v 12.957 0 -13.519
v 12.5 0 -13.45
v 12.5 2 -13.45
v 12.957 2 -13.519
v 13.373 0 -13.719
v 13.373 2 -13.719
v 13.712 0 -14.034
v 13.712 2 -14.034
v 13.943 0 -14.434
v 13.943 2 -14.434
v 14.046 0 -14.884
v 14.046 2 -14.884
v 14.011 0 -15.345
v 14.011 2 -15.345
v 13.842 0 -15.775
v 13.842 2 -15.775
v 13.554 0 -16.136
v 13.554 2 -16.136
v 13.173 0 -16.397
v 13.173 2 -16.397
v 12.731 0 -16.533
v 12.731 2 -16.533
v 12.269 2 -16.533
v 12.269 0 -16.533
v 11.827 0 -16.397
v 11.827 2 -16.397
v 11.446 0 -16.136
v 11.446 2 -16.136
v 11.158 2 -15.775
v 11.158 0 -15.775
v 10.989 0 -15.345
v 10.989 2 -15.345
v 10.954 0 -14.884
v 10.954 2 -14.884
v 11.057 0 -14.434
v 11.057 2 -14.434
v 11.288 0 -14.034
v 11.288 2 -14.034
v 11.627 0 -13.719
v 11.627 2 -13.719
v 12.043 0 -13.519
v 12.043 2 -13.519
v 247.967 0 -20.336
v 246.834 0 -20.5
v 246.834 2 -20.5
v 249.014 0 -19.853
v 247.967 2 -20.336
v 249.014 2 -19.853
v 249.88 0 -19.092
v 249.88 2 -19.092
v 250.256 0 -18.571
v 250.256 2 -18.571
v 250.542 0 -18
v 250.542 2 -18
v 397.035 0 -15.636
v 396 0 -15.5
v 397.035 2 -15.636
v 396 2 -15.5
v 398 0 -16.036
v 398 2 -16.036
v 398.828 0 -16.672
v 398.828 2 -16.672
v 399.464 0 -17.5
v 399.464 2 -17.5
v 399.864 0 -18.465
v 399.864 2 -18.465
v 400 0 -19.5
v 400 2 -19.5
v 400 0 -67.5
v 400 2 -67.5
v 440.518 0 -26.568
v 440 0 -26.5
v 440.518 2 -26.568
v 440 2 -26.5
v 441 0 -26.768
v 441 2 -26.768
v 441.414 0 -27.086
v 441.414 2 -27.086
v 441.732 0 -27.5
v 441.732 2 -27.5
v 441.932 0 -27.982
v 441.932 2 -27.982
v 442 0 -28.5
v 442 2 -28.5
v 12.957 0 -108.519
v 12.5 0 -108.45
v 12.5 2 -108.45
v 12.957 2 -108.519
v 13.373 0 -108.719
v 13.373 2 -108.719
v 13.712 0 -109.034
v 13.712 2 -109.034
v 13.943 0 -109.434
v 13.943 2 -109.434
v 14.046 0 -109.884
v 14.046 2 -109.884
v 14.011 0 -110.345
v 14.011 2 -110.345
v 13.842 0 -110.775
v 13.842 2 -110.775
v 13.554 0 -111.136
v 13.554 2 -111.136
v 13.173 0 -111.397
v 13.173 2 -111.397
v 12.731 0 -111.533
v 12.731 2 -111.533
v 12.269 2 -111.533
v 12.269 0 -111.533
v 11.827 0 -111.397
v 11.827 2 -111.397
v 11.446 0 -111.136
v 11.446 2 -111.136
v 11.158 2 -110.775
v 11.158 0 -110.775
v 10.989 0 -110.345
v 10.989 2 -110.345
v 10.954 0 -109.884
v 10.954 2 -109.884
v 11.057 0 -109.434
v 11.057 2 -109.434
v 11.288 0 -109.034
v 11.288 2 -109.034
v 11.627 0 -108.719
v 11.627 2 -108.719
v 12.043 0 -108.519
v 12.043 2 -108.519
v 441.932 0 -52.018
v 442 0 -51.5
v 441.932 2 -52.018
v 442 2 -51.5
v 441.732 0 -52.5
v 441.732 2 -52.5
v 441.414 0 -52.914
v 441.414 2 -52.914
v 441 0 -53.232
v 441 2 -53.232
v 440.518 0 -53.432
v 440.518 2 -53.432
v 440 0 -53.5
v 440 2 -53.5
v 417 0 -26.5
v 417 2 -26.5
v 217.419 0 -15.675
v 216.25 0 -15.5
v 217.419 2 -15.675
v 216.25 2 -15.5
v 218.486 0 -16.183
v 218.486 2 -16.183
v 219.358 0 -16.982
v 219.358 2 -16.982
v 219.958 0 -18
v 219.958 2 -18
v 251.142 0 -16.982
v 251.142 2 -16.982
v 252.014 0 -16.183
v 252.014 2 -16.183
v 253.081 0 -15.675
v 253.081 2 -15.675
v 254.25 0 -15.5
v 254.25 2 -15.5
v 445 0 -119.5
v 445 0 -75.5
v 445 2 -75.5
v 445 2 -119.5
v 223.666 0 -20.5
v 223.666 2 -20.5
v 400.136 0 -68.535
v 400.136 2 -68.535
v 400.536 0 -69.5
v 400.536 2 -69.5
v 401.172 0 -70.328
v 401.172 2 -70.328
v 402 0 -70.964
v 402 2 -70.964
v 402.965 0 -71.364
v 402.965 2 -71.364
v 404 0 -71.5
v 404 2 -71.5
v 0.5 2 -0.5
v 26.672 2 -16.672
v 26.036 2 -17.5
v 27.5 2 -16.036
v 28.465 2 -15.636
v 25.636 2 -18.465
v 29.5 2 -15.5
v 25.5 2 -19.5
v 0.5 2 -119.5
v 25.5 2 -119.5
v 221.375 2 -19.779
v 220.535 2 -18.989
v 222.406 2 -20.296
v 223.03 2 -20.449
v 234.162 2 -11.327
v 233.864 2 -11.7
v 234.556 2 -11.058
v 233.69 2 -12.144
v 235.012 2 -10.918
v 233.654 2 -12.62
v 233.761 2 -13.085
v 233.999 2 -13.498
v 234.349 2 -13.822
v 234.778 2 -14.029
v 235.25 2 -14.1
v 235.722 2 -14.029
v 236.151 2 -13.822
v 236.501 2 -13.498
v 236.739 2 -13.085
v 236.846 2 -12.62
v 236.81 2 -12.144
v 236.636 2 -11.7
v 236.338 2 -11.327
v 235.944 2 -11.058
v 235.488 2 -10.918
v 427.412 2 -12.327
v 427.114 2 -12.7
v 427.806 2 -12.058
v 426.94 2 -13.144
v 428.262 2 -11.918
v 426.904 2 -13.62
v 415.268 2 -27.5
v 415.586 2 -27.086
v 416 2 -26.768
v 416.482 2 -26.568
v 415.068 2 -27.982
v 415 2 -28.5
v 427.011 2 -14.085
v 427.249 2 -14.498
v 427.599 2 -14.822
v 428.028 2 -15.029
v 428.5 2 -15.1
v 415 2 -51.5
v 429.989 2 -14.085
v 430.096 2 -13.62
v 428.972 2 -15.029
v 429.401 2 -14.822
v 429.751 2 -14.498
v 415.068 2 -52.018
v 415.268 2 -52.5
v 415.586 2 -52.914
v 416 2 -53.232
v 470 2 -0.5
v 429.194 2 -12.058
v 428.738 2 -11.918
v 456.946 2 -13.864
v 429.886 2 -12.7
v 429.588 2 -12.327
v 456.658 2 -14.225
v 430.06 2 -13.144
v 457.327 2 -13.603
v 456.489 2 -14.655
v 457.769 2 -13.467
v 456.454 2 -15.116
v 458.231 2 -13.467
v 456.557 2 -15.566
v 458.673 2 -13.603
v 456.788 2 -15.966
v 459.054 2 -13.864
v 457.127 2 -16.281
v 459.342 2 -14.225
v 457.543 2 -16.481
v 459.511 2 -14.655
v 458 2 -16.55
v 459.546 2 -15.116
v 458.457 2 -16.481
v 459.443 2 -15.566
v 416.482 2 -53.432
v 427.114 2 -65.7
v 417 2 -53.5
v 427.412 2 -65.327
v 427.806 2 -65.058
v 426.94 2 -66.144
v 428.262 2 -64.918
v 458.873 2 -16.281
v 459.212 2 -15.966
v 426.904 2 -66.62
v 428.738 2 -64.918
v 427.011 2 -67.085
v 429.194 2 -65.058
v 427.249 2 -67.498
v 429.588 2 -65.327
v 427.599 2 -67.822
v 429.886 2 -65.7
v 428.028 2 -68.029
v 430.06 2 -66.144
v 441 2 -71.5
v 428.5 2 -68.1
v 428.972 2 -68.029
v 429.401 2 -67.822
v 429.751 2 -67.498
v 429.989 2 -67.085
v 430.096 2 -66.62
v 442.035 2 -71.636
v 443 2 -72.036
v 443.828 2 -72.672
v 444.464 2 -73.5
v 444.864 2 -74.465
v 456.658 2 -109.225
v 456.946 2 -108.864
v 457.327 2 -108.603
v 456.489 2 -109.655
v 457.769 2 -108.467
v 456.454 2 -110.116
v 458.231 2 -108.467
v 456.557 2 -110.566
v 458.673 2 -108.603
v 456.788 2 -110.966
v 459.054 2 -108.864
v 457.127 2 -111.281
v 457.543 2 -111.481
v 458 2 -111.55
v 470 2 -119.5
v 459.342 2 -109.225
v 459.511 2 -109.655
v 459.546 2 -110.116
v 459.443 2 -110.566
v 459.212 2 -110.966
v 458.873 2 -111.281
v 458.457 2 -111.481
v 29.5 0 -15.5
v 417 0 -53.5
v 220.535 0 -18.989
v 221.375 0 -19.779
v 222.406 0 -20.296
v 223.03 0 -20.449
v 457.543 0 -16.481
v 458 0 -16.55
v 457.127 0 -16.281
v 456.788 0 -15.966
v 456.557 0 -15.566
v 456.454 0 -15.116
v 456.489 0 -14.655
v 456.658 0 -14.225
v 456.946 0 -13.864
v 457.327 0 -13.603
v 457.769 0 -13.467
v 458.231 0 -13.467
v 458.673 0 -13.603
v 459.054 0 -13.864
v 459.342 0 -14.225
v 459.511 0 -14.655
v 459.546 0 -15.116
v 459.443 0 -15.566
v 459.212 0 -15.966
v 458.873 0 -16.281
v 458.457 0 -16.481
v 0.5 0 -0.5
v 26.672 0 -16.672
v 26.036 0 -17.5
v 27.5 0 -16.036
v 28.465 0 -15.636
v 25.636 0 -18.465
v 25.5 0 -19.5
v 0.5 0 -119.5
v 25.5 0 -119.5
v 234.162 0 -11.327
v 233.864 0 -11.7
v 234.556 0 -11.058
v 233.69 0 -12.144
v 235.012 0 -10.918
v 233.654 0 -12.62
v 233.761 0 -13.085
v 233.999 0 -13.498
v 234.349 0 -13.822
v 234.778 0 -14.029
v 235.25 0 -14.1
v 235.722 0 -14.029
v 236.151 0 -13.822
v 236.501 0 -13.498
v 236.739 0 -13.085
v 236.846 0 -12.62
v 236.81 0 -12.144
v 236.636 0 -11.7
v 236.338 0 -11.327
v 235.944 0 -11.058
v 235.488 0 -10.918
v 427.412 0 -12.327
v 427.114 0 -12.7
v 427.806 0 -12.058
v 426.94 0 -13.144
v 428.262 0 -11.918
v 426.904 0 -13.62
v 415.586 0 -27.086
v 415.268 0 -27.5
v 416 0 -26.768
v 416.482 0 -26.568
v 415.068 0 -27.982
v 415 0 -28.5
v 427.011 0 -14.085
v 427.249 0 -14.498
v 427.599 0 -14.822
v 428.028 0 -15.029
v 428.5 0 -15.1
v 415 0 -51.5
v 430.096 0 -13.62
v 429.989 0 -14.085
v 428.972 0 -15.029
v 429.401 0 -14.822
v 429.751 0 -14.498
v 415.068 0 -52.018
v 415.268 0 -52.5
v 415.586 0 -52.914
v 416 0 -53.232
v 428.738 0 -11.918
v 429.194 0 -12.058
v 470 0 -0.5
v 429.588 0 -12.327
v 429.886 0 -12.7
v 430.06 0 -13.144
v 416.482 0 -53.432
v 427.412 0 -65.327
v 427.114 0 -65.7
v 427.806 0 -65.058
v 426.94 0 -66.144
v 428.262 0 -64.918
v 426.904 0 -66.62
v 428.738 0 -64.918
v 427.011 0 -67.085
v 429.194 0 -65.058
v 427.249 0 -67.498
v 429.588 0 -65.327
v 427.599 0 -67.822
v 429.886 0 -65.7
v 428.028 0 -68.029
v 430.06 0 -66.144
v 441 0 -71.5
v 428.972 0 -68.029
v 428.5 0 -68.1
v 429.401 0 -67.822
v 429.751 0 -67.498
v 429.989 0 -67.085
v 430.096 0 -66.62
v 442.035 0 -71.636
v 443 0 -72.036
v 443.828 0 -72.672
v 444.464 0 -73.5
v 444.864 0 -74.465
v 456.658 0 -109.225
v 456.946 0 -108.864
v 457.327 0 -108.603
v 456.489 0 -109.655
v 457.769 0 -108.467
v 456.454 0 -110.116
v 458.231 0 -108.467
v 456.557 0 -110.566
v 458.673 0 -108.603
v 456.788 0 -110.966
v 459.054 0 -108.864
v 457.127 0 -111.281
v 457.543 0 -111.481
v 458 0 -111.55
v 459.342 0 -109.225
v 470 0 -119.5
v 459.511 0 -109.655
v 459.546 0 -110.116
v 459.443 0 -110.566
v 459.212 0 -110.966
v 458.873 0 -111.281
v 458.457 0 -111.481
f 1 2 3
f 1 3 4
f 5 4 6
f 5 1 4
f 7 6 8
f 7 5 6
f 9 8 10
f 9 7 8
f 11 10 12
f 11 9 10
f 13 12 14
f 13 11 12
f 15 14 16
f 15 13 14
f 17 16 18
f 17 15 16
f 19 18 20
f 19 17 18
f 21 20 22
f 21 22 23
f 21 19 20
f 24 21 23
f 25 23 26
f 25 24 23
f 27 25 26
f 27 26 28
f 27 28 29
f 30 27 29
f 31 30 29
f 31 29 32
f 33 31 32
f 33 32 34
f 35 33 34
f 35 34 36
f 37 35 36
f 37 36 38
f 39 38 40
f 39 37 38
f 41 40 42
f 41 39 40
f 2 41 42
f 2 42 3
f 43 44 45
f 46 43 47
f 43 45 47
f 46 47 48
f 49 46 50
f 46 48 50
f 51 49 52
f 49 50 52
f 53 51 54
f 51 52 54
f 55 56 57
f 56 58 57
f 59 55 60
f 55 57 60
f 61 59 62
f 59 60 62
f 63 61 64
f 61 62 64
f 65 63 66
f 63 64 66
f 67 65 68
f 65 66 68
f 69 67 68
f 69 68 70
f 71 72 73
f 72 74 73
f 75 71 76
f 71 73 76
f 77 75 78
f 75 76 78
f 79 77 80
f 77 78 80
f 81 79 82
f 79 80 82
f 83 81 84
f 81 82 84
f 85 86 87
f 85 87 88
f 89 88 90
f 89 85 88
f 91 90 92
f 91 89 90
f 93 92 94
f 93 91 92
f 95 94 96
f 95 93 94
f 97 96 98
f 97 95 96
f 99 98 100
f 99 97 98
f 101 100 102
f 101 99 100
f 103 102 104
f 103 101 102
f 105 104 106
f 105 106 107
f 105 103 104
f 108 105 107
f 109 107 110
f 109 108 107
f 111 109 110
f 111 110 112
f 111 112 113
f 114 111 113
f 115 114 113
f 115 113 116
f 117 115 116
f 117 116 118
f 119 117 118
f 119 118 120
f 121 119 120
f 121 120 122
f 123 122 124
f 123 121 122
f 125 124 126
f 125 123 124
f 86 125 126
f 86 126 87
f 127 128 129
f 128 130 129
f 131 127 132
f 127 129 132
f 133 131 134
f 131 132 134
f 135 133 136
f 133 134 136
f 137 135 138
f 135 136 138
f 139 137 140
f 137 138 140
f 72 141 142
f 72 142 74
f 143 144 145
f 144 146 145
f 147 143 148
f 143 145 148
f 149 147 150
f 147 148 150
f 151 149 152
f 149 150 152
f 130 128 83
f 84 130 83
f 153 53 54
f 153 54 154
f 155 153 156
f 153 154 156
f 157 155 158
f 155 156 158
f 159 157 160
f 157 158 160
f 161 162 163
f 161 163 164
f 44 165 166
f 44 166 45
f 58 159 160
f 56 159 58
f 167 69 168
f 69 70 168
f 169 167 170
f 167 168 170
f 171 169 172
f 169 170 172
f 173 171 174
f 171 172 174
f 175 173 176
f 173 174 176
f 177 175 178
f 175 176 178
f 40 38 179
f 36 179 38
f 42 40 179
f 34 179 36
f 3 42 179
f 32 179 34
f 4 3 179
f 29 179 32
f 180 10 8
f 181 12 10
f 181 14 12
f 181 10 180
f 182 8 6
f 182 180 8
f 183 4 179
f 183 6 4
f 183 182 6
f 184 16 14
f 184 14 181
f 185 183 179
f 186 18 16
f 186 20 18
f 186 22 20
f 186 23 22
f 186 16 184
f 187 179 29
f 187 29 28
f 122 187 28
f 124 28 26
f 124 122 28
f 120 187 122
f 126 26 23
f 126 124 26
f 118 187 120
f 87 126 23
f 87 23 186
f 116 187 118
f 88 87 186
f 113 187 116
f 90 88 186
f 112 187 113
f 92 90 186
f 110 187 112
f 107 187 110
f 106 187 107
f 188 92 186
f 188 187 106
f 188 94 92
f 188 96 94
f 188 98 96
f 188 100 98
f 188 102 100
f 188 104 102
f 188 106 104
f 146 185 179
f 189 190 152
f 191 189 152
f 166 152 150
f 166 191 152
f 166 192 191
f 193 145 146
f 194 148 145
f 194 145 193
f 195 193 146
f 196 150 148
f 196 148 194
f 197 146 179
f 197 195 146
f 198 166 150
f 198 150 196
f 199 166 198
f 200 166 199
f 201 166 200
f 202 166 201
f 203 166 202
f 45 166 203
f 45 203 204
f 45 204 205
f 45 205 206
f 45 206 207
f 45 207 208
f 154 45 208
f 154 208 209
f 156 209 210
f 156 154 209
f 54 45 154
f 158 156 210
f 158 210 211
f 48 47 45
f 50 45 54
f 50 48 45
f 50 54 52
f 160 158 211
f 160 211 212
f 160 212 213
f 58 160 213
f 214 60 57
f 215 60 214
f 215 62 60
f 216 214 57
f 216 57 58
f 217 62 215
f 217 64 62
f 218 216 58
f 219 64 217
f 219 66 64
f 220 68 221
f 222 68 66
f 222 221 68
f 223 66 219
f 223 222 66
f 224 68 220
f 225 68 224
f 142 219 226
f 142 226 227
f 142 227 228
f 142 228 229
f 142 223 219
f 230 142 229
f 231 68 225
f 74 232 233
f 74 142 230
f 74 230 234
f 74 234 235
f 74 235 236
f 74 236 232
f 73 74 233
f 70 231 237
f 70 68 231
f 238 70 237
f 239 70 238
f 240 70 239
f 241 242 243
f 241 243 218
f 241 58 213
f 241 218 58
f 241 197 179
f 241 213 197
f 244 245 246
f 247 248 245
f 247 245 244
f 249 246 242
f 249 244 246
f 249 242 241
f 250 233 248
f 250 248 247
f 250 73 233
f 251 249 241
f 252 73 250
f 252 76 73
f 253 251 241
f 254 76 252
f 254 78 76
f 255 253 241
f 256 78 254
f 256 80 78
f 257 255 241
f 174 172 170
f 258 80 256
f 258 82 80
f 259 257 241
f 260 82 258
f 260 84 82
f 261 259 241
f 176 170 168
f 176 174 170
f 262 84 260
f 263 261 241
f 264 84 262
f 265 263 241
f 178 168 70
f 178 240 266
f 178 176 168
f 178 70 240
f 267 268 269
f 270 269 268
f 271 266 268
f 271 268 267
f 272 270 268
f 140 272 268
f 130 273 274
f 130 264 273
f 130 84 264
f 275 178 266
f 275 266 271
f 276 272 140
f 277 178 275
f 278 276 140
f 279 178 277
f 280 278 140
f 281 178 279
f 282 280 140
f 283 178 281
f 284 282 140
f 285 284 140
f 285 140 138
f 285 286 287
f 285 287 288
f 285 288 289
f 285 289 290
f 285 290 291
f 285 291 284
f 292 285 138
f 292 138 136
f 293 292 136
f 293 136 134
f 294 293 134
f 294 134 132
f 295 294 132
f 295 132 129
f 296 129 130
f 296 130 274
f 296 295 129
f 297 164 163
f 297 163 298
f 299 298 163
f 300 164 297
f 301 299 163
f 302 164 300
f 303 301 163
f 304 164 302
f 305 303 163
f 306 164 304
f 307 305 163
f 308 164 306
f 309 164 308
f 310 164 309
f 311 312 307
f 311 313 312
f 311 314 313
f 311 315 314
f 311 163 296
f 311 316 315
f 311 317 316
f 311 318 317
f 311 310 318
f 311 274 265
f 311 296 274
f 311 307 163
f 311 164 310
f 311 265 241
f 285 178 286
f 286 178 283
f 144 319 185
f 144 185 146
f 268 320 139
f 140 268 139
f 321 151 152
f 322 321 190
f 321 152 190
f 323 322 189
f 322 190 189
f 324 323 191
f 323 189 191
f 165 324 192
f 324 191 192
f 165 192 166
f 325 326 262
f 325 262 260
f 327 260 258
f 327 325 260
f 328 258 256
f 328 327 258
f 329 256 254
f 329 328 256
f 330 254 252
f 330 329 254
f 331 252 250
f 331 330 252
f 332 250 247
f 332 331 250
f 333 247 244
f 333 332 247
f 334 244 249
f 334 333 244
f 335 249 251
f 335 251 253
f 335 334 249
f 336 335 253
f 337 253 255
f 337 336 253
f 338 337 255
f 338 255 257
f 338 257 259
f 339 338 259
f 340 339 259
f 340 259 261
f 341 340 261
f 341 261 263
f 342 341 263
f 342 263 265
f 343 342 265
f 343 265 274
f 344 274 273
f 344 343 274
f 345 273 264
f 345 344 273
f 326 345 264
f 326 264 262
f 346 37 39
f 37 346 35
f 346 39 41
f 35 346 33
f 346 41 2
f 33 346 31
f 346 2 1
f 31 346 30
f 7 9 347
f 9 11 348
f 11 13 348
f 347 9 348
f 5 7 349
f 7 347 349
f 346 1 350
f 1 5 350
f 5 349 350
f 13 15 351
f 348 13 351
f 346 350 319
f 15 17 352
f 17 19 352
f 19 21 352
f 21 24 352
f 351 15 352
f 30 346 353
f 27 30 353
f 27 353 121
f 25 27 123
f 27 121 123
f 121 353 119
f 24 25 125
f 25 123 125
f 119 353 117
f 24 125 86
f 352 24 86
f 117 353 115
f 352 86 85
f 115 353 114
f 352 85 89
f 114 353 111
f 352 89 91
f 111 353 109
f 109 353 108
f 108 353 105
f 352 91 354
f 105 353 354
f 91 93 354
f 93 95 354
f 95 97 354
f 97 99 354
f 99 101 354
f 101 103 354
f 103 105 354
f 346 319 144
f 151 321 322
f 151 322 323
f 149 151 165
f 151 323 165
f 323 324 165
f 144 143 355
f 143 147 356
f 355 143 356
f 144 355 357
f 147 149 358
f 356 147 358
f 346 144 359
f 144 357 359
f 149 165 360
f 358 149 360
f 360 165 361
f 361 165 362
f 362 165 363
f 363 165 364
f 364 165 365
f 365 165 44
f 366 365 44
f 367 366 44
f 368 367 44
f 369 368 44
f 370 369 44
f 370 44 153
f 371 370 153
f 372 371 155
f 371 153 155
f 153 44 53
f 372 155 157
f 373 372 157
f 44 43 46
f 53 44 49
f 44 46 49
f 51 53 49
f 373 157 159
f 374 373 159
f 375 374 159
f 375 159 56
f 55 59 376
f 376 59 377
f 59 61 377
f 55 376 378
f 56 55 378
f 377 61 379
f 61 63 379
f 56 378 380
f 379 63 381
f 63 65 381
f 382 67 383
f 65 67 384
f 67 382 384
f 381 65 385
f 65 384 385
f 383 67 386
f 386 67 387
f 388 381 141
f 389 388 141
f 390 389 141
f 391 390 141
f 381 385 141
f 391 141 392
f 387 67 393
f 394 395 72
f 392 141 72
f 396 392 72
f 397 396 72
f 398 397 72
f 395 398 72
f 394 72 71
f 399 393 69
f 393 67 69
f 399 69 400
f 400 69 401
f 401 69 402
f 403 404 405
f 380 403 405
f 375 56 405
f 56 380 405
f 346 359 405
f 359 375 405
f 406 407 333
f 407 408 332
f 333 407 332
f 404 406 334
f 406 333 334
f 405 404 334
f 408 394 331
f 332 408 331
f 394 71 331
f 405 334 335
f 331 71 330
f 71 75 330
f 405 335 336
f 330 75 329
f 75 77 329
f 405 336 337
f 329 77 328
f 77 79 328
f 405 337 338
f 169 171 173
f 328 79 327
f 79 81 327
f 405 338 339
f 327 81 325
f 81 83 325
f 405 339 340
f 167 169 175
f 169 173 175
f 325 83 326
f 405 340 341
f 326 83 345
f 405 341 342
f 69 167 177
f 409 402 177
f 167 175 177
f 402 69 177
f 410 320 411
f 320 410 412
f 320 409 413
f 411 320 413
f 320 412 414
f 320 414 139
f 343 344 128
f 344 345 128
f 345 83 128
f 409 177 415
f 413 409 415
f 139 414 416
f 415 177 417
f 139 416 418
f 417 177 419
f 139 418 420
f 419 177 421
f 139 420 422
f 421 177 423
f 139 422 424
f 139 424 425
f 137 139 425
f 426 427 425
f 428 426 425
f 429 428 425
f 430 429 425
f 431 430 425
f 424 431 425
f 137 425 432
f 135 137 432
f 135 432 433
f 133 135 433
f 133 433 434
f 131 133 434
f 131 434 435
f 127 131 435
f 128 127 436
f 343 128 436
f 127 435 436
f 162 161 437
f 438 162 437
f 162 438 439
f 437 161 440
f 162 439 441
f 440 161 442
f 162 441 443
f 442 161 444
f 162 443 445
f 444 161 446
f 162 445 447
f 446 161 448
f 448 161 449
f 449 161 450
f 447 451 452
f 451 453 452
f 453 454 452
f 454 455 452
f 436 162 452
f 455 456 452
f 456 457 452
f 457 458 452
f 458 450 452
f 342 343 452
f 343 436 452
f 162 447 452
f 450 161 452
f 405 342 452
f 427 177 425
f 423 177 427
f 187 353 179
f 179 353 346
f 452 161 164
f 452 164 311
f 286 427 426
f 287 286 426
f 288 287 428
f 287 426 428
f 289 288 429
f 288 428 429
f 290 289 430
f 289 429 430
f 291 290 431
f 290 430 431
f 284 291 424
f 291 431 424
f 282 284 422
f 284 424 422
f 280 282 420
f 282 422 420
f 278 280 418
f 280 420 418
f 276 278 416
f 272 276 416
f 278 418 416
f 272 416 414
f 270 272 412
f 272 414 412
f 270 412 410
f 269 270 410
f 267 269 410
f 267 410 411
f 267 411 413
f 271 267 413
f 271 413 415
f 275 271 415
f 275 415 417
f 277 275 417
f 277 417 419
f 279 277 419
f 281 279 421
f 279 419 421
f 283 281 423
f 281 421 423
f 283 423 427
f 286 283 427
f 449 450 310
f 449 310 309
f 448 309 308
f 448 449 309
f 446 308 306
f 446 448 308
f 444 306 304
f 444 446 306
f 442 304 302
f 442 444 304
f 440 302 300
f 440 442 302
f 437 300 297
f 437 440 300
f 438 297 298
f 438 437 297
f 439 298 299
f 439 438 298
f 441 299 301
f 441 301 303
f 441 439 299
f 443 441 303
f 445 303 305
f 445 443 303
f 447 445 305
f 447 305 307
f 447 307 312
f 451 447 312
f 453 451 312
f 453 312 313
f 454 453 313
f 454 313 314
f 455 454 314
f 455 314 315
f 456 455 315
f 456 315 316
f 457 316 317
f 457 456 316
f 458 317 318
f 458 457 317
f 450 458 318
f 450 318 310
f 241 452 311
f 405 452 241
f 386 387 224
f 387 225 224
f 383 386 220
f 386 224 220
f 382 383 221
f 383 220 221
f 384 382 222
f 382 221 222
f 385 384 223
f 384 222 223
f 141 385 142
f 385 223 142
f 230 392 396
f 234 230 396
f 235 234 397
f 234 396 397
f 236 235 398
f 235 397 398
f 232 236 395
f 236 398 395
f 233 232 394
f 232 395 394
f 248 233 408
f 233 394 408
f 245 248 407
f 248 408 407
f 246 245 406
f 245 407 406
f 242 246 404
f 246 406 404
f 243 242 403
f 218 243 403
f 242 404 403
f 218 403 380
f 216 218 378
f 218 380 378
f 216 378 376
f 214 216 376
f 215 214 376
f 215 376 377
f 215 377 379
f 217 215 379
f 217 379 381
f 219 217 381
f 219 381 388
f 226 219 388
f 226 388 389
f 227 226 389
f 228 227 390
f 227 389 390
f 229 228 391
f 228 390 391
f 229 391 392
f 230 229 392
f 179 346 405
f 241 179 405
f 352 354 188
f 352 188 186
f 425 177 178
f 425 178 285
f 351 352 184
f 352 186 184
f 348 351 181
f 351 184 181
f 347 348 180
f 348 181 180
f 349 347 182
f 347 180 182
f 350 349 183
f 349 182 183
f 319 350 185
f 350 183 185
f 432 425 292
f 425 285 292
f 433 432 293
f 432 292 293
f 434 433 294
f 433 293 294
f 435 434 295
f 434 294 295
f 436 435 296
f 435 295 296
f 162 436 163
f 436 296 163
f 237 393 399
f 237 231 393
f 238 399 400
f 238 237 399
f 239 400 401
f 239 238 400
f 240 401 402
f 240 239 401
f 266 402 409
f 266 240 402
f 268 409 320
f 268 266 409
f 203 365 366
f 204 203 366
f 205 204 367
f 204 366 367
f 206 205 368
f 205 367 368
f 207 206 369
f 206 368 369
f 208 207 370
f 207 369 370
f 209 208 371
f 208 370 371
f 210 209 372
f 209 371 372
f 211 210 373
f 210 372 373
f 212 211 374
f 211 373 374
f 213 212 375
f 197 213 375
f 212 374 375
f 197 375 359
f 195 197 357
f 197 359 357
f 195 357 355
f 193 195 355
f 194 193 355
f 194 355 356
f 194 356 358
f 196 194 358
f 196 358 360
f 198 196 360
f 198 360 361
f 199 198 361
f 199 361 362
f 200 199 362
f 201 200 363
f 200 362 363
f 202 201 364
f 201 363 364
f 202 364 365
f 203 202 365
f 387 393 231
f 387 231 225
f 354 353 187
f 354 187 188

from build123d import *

# Parameters (mm, degrees)
CROQUIS1_W              = 470.5
CROQUIS1_H              = 120
CROQUIS1_R              = 1.55
SALIENTE_EXTRUIR1_DEPTH = 2
CROQUIS2_W              = 470.5
CROQUIS2_H              = 120
CROQUIS2_W_2            = 469.5
CROQUIS2_H_2            = 119
CORTAR_EXTRUIR1_DEPTH   = 2
CROQUIS3_R              = 1.6
CORTAR_EXTRUIR2_DEPTH   = 2
CROQUIS4_R              = 1.6
CROQUIS4_W              = 27
CROQUIS4_H              = 27
CORTAR_EXTRUIR3_DEPTH   = 2
REDONDEO1_R             = 2
CORTAR_EXTRUIR4_DEPTH   = 2
REDONDEO2_R             = 4
REDONDEO3_R             = 4


with BuildPart() as part:
    # Croquis1 → Saliente-Extruir1 (new body)
    with BuildSketch(Plane(origin=(0, 0, 0), x_dir=(1, 0, 0), z_dir=(0, 1, 0))):
        with Locations((235.25, 60)):
            Rectangle(CROQUIS1_W, CROQUIS1_H)
        with Locations(Location((12.5, 15, 0), (0, 0, 270))):
            Circle(CROQUIS1_R, mode=Mode.SUBTRACT)
        with Locations(Location((12.5, 110, 0), (0, 0, 270))):
            Circle(CROQUIS1_R, mode=Mode.SUBTRACT)
        with Locations(Location((458, 15, 0), (0, 0, 90))):
            Circle(CROQUIS1_R, mode=Mode.SUBTRACT)
        with Locations(Location((458, 110, 0), (0, 0, 90))):
            Circle(CROQUIS1_R, mode=Mode.SUBTRACT)
    extrude(amount=SALIENTE_EXTRUIR1_DEPTH)

    # Croquis2 → Cortar-Extruir1 (cut)
    with BuildSketch(Plane.XZ):
        with Locations((235.25, -60)):
            Rectangle(CROQUIS2_W, CROQUIS2_H)
        with Locations((235.25, -60)):
            Rectangle(CROQUIS2_W_2, CROQUIS2_H_2, mode=Mode.SUBTRACT)
    extrude(amount=-CORTAR_EXTRUIR1_DEPTH, mode=Mode.SUBTRACT)

    # Croquis3 → Cortar-Extruir2 (cut)
    with BuildSketch(Plane.XZ):
        with Locations(Location((235.25, -12.5, 0), (0, 0, 270))):
            Circle(CROQUIS3_R)
    extrude(amount=-CORTAR_EXTRUIR2_DEPTH, mode=Mode.SUBTRACT)

    # Croquis4 → Cortar-Extruir3 (cut)
    with BuildSketch(Plane.XZ):
        with Locations(Location((428.5, -66.5, 0), (0, 0, 270))):
            Circle(CROQUIS4_R)
        with Locations(Location((428.5, -13.5, 0), (0, 0, 270))):
            Circle(CROQUIS4_R)
        with Locations((428.5, -40)):
            Rectangle(CROQUIS4_W, CROQUIS4_H)
    extrude(amount=-CORTAR_EXTRUIR3_DEPTH, mode=Mode.SUBTRACT)

    # Redondeo1
    redondeo1_edges = [part.edges().sort_by_distance(p)[0] for p in [
        (415, 1, -53.5),
        (442, 1, -53.5),
        (442, 1, -26.5),
        (415, 1, -26.5),
    ]]
    fillet(redondeo1_edges, radius=REDONDEO1_R)

    # Croquis5 → Cortar-Extruir4 (cut)
    with BuildSketch(Plane.XZ):
        Polygon((25.5, -119.5), (25.5, -15.5), (220.25, -15.5), (220.25, -20.5), (250.25, -20.5), (250.25, -15.5), (400, -15.5), (400, -71.5), (445, -71.5), (445, -119.5), align=None)
    extrude(amount=-CORTAR_EXTRUIR4_DEPTH, mode=Mode.SUBTRACT)

    # Redondeo2
    redondeo2_edges = [part.edges().sort_by_distance(p)[0] for p in [
        (25.5, 1, -15.5),
        (220.25, 1, -15.5),
        (250.25, 1, -15.5),
        (400, 1, -15.5),
        (400, 1, -71.5),
        (445, 1, -71.5),
    ]]
    fillet(redondeo2_edges, radius=REDONDEO2_R)

    # Redondeo3
    redondeo3_edges = [part.edges().sort_by_distance(p)[0] for p in [
        (220.25, 1, -20.5),
        (250.25, 1, -20.5),
    ]]
    fillet(redondeo3_edges, radius=REDONDEO3_R)


solid = part.part
